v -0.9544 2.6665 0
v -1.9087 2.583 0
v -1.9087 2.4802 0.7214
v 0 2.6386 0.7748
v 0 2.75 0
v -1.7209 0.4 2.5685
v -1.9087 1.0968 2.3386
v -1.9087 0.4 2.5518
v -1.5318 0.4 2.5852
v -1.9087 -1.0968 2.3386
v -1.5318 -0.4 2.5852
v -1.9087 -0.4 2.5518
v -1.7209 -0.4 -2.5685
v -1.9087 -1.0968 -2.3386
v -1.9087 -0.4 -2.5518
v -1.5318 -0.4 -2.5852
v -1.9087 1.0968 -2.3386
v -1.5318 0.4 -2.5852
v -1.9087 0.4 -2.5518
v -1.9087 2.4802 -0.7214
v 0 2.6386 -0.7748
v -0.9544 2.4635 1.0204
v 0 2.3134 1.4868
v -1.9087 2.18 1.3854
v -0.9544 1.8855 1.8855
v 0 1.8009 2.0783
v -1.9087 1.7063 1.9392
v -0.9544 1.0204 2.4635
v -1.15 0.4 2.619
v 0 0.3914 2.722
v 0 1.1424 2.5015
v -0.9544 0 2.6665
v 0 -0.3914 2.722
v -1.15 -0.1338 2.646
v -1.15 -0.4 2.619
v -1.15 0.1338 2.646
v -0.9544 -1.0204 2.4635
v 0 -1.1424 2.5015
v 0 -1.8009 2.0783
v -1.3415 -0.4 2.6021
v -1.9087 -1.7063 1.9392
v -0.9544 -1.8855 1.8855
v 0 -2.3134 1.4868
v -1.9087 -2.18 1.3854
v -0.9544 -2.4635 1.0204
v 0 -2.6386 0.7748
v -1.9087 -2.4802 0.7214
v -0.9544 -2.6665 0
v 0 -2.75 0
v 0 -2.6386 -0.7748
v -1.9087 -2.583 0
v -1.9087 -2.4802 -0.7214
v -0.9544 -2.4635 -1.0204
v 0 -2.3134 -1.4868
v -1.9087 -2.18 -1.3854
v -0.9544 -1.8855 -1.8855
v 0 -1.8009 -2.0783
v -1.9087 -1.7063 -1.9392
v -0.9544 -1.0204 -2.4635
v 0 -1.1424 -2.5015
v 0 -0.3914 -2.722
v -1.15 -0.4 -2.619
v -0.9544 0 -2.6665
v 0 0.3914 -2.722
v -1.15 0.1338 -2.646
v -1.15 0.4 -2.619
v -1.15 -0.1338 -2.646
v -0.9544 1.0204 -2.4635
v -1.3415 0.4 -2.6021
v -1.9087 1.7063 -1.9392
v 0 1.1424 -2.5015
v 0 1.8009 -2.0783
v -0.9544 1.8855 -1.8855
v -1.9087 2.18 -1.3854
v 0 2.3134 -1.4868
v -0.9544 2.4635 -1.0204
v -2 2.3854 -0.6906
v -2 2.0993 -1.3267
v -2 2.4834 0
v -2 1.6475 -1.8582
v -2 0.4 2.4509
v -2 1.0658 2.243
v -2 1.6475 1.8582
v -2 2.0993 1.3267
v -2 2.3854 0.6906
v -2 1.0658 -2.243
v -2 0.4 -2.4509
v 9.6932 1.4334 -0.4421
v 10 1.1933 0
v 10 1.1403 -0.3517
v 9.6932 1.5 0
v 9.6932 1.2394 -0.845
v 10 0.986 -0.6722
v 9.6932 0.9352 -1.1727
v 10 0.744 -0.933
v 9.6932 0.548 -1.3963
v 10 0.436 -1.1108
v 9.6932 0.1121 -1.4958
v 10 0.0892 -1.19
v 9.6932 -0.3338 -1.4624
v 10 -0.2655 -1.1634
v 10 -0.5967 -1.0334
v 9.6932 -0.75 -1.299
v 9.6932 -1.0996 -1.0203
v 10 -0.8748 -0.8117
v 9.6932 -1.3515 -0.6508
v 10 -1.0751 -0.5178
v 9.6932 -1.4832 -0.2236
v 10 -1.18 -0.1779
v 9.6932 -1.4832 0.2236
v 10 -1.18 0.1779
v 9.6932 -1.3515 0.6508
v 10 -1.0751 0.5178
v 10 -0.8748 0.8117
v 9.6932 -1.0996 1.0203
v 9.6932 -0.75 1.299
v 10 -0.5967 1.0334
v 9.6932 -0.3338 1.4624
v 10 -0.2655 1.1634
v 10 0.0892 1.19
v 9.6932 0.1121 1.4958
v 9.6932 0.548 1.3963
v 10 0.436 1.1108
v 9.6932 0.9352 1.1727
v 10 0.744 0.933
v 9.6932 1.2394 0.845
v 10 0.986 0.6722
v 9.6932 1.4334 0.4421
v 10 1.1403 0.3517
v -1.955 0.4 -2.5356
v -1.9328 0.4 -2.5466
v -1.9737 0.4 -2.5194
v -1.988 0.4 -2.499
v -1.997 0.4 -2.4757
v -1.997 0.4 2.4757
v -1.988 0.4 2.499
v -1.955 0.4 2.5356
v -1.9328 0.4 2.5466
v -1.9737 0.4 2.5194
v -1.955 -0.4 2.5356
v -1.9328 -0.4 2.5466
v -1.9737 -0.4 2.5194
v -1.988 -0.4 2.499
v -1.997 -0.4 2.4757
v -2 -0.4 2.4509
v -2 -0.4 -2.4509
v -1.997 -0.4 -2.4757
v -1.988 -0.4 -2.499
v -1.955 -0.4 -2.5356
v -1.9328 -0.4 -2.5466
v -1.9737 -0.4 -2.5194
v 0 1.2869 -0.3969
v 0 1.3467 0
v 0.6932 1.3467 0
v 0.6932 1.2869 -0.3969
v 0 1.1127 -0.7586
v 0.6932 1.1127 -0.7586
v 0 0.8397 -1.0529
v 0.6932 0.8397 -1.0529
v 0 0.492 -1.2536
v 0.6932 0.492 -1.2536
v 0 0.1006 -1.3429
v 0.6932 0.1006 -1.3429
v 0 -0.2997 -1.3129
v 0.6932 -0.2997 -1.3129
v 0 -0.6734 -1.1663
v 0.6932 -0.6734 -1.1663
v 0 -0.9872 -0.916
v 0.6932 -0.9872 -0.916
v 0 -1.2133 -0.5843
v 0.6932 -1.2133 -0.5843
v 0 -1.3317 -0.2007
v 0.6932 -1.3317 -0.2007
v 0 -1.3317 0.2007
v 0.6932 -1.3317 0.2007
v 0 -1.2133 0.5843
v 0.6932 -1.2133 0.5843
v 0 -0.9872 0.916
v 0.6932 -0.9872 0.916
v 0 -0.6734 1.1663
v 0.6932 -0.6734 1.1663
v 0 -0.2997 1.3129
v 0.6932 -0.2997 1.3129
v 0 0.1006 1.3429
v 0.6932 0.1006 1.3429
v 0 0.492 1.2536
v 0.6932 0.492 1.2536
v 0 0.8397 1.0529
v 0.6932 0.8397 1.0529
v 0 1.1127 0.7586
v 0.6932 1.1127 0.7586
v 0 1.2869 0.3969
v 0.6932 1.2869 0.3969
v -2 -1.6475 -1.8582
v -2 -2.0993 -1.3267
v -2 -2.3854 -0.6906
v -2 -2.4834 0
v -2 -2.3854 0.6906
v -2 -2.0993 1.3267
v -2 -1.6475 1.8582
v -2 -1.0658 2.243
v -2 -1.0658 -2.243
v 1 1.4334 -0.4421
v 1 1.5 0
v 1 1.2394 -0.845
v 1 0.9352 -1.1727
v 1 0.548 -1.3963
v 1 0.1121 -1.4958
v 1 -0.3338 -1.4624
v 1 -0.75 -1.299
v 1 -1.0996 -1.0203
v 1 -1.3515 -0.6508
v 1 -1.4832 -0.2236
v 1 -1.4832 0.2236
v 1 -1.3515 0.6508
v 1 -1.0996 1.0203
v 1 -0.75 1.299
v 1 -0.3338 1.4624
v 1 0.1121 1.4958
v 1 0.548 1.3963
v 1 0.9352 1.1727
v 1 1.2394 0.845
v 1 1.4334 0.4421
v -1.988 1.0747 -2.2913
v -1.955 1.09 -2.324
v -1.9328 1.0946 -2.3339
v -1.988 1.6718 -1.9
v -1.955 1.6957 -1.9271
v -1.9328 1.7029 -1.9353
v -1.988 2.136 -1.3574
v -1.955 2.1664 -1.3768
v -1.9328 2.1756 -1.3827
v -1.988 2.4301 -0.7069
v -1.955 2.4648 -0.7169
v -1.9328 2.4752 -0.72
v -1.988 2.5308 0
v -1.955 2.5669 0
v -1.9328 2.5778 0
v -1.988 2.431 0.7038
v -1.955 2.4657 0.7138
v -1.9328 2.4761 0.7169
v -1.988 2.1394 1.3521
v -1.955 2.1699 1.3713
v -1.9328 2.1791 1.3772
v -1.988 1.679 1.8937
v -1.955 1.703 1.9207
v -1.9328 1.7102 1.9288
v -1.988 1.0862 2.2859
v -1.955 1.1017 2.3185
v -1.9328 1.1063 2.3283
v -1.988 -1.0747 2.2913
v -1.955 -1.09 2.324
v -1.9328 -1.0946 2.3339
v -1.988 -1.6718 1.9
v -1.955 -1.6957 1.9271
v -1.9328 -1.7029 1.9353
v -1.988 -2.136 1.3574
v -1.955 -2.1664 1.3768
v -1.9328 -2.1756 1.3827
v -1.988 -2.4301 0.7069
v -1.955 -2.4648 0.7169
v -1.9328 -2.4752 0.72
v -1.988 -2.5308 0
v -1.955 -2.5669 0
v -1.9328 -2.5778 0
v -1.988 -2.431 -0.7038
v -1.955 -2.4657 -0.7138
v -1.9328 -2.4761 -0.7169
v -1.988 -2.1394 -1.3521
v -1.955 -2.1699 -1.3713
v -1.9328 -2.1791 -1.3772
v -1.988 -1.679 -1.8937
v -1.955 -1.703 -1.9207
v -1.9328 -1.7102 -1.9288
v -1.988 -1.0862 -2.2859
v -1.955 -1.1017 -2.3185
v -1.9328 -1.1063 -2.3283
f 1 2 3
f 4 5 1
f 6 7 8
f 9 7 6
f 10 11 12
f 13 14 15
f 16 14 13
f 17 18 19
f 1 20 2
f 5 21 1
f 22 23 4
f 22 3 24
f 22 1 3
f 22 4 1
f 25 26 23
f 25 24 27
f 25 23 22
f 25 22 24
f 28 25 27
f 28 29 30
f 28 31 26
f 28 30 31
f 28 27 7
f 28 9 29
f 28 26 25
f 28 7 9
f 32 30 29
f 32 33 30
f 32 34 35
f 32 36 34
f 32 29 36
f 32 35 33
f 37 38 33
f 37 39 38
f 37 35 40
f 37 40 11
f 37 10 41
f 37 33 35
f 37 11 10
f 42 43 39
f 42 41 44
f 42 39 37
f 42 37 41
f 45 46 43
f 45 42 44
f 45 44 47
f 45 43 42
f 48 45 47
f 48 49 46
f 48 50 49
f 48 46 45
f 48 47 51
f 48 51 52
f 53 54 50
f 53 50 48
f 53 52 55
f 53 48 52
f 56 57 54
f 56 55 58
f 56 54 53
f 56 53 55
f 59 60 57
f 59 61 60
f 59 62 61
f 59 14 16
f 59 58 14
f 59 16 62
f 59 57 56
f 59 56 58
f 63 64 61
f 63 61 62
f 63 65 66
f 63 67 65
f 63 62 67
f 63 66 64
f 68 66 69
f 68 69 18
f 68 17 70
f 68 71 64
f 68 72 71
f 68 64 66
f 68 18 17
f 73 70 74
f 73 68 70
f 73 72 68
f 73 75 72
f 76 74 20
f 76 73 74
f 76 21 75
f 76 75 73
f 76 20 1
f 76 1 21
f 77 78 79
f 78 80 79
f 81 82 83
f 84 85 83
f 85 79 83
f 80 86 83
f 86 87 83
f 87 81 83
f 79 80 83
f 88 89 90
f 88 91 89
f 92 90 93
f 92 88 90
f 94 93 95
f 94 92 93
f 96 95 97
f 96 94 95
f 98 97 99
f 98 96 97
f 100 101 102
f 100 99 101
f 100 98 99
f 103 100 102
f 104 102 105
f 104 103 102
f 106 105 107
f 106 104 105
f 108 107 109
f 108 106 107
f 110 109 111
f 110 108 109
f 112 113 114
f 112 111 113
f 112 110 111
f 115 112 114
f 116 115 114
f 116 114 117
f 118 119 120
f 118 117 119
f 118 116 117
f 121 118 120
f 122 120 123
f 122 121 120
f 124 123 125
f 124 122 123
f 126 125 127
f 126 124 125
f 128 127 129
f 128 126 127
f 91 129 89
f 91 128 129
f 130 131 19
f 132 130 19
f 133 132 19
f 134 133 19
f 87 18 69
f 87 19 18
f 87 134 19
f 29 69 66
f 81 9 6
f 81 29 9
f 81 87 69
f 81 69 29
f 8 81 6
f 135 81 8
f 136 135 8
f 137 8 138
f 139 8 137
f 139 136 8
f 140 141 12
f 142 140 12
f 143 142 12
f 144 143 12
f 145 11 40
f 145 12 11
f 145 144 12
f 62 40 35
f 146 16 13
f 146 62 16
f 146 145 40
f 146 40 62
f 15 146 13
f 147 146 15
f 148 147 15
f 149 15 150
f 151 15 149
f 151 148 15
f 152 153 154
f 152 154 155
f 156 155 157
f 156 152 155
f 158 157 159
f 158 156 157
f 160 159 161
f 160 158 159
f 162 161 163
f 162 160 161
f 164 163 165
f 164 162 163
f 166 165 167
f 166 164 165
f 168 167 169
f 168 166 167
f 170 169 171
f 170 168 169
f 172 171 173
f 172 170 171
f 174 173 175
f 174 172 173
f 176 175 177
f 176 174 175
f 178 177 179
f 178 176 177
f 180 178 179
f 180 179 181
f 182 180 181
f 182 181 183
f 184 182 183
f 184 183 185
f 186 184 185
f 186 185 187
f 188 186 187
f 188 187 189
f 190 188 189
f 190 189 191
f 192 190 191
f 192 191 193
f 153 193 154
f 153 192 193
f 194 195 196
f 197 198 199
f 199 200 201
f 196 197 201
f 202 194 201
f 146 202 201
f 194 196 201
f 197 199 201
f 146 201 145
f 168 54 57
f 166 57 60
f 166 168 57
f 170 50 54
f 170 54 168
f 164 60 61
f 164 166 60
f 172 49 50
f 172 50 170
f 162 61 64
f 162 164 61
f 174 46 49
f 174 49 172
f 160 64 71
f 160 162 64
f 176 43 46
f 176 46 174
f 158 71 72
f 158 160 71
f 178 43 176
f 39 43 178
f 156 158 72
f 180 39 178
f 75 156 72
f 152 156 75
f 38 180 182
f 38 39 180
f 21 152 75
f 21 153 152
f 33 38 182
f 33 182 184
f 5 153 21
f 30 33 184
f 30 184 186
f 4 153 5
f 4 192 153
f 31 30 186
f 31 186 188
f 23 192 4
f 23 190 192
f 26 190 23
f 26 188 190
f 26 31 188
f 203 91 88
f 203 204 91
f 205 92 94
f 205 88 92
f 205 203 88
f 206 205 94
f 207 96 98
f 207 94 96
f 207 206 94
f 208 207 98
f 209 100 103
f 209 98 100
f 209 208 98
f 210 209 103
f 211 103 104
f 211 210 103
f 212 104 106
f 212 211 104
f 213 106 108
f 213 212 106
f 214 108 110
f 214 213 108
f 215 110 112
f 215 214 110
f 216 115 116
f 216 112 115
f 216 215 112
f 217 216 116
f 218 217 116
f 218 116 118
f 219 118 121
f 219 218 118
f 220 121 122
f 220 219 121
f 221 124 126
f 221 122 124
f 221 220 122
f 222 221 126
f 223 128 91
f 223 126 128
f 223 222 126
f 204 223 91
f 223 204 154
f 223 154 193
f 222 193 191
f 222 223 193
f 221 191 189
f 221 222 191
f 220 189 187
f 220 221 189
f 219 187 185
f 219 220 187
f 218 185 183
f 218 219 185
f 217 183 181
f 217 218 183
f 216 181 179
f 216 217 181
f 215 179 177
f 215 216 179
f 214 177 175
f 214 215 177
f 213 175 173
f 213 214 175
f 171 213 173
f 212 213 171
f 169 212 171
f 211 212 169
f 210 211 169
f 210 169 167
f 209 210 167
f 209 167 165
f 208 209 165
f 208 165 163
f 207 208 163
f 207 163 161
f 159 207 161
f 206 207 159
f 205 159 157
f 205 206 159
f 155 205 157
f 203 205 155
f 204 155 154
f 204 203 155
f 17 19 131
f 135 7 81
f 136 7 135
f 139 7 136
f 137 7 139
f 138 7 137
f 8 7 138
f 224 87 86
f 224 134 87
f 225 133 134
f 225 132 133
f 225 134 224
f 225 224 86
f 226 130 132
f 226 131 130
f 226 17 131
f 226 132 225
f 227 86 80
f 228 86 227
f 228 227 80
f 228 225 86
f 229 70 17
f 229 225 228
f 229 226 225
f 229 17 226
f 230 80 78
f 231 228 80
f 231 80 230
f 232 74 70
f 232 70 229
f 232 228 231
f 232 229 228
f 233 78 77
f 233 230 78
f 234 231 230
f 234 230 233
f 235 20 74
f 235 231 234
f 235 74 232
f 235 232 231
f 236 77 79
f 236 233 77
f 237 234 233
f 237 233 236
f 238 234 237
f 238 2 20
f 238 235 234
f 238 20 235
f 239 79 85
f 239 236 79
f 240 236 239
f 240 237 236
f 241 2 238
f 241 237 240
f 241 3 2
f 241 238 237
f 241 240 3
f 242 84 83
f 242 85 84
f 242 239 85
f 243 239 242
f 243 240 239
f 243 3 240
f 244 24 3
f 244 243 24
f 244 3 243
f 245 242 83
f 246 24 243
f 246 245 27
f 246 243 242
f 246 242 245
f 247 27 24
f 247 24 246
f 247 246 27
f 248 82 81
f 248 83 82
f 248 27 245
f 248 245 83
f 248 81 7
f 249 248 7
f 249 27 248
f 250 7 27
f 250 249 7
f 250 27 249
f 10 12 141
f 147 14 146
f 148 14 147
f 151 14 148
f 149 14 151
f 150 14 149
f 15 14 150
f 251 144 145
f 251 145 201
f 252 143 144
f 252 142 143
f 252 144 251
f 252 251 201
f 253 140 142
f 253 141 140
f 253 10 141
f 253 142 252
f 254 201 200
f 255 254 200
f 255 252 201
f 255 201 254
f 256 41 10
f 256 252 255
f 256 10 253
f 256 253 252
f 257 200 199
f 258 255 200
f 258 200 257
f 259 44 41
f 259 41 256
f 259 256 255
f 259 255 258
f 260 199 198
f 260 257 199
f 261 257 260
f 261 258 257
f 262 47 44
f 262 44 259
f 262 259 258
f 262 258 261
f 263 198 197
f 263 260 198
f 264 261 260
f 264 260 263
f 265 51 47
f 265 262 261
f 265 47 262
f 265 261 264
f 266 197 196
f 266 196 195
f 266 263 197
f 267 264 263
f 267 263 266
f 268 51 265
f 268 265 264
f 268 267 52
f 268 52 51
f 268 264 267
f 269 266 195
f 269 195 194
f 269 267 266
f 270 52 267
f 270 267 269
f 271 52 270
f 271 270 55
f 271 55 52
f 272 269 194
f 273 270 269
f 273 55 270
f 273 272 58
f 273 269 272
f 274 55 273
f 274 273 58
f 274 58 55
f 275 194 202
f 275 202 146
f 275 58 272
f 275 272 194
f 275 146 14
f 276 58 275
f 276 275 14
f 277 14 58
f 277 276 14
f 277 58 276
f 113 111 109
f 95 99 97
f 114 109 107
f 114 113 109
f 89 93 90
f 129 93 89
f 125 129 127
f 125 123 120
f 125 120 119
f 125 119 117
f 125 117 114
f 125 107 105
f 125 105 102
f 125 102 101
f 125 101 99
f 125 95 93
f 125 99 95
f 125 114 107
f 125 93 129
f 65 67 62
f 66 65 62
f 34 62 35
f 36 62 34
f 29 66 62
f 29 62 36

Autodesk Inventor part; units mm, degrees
ref_plane "YZ Plane" through (0, 0, 0) normal (1, 0, 0) x (0, 1, 0)
ref_plane "XZ Plane" through (0, 0, 0) normal (0, 1, 0) x (-1, 0, 0)
sketch "Szkic1" plane through (0, 0, 0) normal (0, 0, 1) x (1, 0, 0)
  line L0 (-2, 0) -> (10, 0)
  line L1 (10, 0) -> (10, 1.5)
  line L2 (10, 1.5) -> (1, 1.5)
  line L3 (1, 1.5) -> (0.6932, 1.3467)
  line L4 (0.6932, 1.3467) -> (0, 1.3467)
  line L5 (0, 1.3467) -> (0, 2.75)
  line L6 (-4.4, 0) -> (12.4, 0) projected
  line L7 (0, -0.55) -> (0, 3.3) projected
  line L8 (-2, 0) -> (-2, 2.575)
  line L9 (0, 2.75) -> (-2, 2.575)
  line L10 (1, 1.5) -> (0, 1.5) construction
  dimension "d0" = 10
  dimension "d1" = 9
  dimension "d2" = 0.3068
  dimension "d3" = 2
  dimension "d4" = 3
  dimension "d5" = 2.6935
  dimension "d9" = 5.5
  dimension "d10" = 5
revolve "Bryła" add sketch "Szkic1" angle 360 about axis through (-2, 0, 0) along (1, 0, 0)
sketch "Szkic2" plane through (-2, 0, 0) normal (-1, 0, 0) x (0, 0, 1)
  circle A0 centre (0, 0) radius 2.75 projected
  line L0 (0, 0) -> (0, 2.575) projected
  line L1 (-2.75, 0.4) -> (2.75, 0.4)
  line L2 (2.75, 0.4) -> (2.75, -0.4)
  line L3 (2.75, -0.4) -> (-2.75, -0.4)
  line L4 (-2.75, -0.4) -> (-2.75, 0.4)
  line L5 (-2.75, 0) -> (2.75, 0) construction
  line L6 (0, 0.4) -> (0, -0.4) construction
  dimension "d11" = 0.8
  dimension "d12" = 5.5
fillet "Zaokrąglenie1" radius 0.1 1 edges at (-2, -2.575, 0)
extrude "Szczelina" cut sketch "Szkic2" against normal blind 0.85 contours A0 L3 L1 | L2 L3 A0 | A0 L1 L2 | A0 L4 L1 | L3 L4 A0
thread "Gwint" size "M3x0.5" class "6g" standard "ISO Metric profile" length 9
chamfer "Faza1" distance 0.3067 distance2 0.3068 1 edges at (10, -1.5, 0) measured on face at (10, 0.417, 0.2189)
ref_plane "Work Plane1" through (30.1625, 0, 0) normal (0, 0, -1) x (1, 0, 0)
equation "\"d11\" = SBR"
equation "\"d12\" = KOD"
equation "\"d14\" = RR"
equation "\"d19\" = STI"
equation "\"d15\" = GEL"
equation "\"d17\" = -0.5 * SPD + 0.5 * GD"
equation "\"d0\" = NLG"
equation "\"d1\" = GEL"
equation "\"d3\" = KOH"
equation "\"d4\" = GD"
equation "\"d5\" = BDM"
equation "\"d9\" = KOD"
equation "\"d10\" = KEWI"
equation "\"GD\" = NND"
equation "\"NLG\" = 10"
equation "\"GEL\" = 9"
equation "\"KOD\" = 5.5"
equation "\"KOH\" = 2"
equation "\"GAL\" = 0.61345 * PTC"
equation "\"SPD\" = NND - 1.2269 * PTC"
equation "\"BDM\" = 2.6935"
equation "\"GUL\" = 0.61345 * PTC"
equation "\"RR\" = 0.1"
equation "\"SBR\" = 0.8"
equation "\"STI\" = 0.85"
equation "\"KEWI\" = 5deg"
equation "\"PTC\" = 0.5"
equation "\"THREADDIA\" = 3"
equation "\"TOA\" = 30deg"
equation "\"NND\" = 3"
equation "\"GD1\" = THREADDIA - 1.2269 * PTC"
properties part number "ISO 1207 - M3 x 10" material "Stal nierdzewna 440C"
